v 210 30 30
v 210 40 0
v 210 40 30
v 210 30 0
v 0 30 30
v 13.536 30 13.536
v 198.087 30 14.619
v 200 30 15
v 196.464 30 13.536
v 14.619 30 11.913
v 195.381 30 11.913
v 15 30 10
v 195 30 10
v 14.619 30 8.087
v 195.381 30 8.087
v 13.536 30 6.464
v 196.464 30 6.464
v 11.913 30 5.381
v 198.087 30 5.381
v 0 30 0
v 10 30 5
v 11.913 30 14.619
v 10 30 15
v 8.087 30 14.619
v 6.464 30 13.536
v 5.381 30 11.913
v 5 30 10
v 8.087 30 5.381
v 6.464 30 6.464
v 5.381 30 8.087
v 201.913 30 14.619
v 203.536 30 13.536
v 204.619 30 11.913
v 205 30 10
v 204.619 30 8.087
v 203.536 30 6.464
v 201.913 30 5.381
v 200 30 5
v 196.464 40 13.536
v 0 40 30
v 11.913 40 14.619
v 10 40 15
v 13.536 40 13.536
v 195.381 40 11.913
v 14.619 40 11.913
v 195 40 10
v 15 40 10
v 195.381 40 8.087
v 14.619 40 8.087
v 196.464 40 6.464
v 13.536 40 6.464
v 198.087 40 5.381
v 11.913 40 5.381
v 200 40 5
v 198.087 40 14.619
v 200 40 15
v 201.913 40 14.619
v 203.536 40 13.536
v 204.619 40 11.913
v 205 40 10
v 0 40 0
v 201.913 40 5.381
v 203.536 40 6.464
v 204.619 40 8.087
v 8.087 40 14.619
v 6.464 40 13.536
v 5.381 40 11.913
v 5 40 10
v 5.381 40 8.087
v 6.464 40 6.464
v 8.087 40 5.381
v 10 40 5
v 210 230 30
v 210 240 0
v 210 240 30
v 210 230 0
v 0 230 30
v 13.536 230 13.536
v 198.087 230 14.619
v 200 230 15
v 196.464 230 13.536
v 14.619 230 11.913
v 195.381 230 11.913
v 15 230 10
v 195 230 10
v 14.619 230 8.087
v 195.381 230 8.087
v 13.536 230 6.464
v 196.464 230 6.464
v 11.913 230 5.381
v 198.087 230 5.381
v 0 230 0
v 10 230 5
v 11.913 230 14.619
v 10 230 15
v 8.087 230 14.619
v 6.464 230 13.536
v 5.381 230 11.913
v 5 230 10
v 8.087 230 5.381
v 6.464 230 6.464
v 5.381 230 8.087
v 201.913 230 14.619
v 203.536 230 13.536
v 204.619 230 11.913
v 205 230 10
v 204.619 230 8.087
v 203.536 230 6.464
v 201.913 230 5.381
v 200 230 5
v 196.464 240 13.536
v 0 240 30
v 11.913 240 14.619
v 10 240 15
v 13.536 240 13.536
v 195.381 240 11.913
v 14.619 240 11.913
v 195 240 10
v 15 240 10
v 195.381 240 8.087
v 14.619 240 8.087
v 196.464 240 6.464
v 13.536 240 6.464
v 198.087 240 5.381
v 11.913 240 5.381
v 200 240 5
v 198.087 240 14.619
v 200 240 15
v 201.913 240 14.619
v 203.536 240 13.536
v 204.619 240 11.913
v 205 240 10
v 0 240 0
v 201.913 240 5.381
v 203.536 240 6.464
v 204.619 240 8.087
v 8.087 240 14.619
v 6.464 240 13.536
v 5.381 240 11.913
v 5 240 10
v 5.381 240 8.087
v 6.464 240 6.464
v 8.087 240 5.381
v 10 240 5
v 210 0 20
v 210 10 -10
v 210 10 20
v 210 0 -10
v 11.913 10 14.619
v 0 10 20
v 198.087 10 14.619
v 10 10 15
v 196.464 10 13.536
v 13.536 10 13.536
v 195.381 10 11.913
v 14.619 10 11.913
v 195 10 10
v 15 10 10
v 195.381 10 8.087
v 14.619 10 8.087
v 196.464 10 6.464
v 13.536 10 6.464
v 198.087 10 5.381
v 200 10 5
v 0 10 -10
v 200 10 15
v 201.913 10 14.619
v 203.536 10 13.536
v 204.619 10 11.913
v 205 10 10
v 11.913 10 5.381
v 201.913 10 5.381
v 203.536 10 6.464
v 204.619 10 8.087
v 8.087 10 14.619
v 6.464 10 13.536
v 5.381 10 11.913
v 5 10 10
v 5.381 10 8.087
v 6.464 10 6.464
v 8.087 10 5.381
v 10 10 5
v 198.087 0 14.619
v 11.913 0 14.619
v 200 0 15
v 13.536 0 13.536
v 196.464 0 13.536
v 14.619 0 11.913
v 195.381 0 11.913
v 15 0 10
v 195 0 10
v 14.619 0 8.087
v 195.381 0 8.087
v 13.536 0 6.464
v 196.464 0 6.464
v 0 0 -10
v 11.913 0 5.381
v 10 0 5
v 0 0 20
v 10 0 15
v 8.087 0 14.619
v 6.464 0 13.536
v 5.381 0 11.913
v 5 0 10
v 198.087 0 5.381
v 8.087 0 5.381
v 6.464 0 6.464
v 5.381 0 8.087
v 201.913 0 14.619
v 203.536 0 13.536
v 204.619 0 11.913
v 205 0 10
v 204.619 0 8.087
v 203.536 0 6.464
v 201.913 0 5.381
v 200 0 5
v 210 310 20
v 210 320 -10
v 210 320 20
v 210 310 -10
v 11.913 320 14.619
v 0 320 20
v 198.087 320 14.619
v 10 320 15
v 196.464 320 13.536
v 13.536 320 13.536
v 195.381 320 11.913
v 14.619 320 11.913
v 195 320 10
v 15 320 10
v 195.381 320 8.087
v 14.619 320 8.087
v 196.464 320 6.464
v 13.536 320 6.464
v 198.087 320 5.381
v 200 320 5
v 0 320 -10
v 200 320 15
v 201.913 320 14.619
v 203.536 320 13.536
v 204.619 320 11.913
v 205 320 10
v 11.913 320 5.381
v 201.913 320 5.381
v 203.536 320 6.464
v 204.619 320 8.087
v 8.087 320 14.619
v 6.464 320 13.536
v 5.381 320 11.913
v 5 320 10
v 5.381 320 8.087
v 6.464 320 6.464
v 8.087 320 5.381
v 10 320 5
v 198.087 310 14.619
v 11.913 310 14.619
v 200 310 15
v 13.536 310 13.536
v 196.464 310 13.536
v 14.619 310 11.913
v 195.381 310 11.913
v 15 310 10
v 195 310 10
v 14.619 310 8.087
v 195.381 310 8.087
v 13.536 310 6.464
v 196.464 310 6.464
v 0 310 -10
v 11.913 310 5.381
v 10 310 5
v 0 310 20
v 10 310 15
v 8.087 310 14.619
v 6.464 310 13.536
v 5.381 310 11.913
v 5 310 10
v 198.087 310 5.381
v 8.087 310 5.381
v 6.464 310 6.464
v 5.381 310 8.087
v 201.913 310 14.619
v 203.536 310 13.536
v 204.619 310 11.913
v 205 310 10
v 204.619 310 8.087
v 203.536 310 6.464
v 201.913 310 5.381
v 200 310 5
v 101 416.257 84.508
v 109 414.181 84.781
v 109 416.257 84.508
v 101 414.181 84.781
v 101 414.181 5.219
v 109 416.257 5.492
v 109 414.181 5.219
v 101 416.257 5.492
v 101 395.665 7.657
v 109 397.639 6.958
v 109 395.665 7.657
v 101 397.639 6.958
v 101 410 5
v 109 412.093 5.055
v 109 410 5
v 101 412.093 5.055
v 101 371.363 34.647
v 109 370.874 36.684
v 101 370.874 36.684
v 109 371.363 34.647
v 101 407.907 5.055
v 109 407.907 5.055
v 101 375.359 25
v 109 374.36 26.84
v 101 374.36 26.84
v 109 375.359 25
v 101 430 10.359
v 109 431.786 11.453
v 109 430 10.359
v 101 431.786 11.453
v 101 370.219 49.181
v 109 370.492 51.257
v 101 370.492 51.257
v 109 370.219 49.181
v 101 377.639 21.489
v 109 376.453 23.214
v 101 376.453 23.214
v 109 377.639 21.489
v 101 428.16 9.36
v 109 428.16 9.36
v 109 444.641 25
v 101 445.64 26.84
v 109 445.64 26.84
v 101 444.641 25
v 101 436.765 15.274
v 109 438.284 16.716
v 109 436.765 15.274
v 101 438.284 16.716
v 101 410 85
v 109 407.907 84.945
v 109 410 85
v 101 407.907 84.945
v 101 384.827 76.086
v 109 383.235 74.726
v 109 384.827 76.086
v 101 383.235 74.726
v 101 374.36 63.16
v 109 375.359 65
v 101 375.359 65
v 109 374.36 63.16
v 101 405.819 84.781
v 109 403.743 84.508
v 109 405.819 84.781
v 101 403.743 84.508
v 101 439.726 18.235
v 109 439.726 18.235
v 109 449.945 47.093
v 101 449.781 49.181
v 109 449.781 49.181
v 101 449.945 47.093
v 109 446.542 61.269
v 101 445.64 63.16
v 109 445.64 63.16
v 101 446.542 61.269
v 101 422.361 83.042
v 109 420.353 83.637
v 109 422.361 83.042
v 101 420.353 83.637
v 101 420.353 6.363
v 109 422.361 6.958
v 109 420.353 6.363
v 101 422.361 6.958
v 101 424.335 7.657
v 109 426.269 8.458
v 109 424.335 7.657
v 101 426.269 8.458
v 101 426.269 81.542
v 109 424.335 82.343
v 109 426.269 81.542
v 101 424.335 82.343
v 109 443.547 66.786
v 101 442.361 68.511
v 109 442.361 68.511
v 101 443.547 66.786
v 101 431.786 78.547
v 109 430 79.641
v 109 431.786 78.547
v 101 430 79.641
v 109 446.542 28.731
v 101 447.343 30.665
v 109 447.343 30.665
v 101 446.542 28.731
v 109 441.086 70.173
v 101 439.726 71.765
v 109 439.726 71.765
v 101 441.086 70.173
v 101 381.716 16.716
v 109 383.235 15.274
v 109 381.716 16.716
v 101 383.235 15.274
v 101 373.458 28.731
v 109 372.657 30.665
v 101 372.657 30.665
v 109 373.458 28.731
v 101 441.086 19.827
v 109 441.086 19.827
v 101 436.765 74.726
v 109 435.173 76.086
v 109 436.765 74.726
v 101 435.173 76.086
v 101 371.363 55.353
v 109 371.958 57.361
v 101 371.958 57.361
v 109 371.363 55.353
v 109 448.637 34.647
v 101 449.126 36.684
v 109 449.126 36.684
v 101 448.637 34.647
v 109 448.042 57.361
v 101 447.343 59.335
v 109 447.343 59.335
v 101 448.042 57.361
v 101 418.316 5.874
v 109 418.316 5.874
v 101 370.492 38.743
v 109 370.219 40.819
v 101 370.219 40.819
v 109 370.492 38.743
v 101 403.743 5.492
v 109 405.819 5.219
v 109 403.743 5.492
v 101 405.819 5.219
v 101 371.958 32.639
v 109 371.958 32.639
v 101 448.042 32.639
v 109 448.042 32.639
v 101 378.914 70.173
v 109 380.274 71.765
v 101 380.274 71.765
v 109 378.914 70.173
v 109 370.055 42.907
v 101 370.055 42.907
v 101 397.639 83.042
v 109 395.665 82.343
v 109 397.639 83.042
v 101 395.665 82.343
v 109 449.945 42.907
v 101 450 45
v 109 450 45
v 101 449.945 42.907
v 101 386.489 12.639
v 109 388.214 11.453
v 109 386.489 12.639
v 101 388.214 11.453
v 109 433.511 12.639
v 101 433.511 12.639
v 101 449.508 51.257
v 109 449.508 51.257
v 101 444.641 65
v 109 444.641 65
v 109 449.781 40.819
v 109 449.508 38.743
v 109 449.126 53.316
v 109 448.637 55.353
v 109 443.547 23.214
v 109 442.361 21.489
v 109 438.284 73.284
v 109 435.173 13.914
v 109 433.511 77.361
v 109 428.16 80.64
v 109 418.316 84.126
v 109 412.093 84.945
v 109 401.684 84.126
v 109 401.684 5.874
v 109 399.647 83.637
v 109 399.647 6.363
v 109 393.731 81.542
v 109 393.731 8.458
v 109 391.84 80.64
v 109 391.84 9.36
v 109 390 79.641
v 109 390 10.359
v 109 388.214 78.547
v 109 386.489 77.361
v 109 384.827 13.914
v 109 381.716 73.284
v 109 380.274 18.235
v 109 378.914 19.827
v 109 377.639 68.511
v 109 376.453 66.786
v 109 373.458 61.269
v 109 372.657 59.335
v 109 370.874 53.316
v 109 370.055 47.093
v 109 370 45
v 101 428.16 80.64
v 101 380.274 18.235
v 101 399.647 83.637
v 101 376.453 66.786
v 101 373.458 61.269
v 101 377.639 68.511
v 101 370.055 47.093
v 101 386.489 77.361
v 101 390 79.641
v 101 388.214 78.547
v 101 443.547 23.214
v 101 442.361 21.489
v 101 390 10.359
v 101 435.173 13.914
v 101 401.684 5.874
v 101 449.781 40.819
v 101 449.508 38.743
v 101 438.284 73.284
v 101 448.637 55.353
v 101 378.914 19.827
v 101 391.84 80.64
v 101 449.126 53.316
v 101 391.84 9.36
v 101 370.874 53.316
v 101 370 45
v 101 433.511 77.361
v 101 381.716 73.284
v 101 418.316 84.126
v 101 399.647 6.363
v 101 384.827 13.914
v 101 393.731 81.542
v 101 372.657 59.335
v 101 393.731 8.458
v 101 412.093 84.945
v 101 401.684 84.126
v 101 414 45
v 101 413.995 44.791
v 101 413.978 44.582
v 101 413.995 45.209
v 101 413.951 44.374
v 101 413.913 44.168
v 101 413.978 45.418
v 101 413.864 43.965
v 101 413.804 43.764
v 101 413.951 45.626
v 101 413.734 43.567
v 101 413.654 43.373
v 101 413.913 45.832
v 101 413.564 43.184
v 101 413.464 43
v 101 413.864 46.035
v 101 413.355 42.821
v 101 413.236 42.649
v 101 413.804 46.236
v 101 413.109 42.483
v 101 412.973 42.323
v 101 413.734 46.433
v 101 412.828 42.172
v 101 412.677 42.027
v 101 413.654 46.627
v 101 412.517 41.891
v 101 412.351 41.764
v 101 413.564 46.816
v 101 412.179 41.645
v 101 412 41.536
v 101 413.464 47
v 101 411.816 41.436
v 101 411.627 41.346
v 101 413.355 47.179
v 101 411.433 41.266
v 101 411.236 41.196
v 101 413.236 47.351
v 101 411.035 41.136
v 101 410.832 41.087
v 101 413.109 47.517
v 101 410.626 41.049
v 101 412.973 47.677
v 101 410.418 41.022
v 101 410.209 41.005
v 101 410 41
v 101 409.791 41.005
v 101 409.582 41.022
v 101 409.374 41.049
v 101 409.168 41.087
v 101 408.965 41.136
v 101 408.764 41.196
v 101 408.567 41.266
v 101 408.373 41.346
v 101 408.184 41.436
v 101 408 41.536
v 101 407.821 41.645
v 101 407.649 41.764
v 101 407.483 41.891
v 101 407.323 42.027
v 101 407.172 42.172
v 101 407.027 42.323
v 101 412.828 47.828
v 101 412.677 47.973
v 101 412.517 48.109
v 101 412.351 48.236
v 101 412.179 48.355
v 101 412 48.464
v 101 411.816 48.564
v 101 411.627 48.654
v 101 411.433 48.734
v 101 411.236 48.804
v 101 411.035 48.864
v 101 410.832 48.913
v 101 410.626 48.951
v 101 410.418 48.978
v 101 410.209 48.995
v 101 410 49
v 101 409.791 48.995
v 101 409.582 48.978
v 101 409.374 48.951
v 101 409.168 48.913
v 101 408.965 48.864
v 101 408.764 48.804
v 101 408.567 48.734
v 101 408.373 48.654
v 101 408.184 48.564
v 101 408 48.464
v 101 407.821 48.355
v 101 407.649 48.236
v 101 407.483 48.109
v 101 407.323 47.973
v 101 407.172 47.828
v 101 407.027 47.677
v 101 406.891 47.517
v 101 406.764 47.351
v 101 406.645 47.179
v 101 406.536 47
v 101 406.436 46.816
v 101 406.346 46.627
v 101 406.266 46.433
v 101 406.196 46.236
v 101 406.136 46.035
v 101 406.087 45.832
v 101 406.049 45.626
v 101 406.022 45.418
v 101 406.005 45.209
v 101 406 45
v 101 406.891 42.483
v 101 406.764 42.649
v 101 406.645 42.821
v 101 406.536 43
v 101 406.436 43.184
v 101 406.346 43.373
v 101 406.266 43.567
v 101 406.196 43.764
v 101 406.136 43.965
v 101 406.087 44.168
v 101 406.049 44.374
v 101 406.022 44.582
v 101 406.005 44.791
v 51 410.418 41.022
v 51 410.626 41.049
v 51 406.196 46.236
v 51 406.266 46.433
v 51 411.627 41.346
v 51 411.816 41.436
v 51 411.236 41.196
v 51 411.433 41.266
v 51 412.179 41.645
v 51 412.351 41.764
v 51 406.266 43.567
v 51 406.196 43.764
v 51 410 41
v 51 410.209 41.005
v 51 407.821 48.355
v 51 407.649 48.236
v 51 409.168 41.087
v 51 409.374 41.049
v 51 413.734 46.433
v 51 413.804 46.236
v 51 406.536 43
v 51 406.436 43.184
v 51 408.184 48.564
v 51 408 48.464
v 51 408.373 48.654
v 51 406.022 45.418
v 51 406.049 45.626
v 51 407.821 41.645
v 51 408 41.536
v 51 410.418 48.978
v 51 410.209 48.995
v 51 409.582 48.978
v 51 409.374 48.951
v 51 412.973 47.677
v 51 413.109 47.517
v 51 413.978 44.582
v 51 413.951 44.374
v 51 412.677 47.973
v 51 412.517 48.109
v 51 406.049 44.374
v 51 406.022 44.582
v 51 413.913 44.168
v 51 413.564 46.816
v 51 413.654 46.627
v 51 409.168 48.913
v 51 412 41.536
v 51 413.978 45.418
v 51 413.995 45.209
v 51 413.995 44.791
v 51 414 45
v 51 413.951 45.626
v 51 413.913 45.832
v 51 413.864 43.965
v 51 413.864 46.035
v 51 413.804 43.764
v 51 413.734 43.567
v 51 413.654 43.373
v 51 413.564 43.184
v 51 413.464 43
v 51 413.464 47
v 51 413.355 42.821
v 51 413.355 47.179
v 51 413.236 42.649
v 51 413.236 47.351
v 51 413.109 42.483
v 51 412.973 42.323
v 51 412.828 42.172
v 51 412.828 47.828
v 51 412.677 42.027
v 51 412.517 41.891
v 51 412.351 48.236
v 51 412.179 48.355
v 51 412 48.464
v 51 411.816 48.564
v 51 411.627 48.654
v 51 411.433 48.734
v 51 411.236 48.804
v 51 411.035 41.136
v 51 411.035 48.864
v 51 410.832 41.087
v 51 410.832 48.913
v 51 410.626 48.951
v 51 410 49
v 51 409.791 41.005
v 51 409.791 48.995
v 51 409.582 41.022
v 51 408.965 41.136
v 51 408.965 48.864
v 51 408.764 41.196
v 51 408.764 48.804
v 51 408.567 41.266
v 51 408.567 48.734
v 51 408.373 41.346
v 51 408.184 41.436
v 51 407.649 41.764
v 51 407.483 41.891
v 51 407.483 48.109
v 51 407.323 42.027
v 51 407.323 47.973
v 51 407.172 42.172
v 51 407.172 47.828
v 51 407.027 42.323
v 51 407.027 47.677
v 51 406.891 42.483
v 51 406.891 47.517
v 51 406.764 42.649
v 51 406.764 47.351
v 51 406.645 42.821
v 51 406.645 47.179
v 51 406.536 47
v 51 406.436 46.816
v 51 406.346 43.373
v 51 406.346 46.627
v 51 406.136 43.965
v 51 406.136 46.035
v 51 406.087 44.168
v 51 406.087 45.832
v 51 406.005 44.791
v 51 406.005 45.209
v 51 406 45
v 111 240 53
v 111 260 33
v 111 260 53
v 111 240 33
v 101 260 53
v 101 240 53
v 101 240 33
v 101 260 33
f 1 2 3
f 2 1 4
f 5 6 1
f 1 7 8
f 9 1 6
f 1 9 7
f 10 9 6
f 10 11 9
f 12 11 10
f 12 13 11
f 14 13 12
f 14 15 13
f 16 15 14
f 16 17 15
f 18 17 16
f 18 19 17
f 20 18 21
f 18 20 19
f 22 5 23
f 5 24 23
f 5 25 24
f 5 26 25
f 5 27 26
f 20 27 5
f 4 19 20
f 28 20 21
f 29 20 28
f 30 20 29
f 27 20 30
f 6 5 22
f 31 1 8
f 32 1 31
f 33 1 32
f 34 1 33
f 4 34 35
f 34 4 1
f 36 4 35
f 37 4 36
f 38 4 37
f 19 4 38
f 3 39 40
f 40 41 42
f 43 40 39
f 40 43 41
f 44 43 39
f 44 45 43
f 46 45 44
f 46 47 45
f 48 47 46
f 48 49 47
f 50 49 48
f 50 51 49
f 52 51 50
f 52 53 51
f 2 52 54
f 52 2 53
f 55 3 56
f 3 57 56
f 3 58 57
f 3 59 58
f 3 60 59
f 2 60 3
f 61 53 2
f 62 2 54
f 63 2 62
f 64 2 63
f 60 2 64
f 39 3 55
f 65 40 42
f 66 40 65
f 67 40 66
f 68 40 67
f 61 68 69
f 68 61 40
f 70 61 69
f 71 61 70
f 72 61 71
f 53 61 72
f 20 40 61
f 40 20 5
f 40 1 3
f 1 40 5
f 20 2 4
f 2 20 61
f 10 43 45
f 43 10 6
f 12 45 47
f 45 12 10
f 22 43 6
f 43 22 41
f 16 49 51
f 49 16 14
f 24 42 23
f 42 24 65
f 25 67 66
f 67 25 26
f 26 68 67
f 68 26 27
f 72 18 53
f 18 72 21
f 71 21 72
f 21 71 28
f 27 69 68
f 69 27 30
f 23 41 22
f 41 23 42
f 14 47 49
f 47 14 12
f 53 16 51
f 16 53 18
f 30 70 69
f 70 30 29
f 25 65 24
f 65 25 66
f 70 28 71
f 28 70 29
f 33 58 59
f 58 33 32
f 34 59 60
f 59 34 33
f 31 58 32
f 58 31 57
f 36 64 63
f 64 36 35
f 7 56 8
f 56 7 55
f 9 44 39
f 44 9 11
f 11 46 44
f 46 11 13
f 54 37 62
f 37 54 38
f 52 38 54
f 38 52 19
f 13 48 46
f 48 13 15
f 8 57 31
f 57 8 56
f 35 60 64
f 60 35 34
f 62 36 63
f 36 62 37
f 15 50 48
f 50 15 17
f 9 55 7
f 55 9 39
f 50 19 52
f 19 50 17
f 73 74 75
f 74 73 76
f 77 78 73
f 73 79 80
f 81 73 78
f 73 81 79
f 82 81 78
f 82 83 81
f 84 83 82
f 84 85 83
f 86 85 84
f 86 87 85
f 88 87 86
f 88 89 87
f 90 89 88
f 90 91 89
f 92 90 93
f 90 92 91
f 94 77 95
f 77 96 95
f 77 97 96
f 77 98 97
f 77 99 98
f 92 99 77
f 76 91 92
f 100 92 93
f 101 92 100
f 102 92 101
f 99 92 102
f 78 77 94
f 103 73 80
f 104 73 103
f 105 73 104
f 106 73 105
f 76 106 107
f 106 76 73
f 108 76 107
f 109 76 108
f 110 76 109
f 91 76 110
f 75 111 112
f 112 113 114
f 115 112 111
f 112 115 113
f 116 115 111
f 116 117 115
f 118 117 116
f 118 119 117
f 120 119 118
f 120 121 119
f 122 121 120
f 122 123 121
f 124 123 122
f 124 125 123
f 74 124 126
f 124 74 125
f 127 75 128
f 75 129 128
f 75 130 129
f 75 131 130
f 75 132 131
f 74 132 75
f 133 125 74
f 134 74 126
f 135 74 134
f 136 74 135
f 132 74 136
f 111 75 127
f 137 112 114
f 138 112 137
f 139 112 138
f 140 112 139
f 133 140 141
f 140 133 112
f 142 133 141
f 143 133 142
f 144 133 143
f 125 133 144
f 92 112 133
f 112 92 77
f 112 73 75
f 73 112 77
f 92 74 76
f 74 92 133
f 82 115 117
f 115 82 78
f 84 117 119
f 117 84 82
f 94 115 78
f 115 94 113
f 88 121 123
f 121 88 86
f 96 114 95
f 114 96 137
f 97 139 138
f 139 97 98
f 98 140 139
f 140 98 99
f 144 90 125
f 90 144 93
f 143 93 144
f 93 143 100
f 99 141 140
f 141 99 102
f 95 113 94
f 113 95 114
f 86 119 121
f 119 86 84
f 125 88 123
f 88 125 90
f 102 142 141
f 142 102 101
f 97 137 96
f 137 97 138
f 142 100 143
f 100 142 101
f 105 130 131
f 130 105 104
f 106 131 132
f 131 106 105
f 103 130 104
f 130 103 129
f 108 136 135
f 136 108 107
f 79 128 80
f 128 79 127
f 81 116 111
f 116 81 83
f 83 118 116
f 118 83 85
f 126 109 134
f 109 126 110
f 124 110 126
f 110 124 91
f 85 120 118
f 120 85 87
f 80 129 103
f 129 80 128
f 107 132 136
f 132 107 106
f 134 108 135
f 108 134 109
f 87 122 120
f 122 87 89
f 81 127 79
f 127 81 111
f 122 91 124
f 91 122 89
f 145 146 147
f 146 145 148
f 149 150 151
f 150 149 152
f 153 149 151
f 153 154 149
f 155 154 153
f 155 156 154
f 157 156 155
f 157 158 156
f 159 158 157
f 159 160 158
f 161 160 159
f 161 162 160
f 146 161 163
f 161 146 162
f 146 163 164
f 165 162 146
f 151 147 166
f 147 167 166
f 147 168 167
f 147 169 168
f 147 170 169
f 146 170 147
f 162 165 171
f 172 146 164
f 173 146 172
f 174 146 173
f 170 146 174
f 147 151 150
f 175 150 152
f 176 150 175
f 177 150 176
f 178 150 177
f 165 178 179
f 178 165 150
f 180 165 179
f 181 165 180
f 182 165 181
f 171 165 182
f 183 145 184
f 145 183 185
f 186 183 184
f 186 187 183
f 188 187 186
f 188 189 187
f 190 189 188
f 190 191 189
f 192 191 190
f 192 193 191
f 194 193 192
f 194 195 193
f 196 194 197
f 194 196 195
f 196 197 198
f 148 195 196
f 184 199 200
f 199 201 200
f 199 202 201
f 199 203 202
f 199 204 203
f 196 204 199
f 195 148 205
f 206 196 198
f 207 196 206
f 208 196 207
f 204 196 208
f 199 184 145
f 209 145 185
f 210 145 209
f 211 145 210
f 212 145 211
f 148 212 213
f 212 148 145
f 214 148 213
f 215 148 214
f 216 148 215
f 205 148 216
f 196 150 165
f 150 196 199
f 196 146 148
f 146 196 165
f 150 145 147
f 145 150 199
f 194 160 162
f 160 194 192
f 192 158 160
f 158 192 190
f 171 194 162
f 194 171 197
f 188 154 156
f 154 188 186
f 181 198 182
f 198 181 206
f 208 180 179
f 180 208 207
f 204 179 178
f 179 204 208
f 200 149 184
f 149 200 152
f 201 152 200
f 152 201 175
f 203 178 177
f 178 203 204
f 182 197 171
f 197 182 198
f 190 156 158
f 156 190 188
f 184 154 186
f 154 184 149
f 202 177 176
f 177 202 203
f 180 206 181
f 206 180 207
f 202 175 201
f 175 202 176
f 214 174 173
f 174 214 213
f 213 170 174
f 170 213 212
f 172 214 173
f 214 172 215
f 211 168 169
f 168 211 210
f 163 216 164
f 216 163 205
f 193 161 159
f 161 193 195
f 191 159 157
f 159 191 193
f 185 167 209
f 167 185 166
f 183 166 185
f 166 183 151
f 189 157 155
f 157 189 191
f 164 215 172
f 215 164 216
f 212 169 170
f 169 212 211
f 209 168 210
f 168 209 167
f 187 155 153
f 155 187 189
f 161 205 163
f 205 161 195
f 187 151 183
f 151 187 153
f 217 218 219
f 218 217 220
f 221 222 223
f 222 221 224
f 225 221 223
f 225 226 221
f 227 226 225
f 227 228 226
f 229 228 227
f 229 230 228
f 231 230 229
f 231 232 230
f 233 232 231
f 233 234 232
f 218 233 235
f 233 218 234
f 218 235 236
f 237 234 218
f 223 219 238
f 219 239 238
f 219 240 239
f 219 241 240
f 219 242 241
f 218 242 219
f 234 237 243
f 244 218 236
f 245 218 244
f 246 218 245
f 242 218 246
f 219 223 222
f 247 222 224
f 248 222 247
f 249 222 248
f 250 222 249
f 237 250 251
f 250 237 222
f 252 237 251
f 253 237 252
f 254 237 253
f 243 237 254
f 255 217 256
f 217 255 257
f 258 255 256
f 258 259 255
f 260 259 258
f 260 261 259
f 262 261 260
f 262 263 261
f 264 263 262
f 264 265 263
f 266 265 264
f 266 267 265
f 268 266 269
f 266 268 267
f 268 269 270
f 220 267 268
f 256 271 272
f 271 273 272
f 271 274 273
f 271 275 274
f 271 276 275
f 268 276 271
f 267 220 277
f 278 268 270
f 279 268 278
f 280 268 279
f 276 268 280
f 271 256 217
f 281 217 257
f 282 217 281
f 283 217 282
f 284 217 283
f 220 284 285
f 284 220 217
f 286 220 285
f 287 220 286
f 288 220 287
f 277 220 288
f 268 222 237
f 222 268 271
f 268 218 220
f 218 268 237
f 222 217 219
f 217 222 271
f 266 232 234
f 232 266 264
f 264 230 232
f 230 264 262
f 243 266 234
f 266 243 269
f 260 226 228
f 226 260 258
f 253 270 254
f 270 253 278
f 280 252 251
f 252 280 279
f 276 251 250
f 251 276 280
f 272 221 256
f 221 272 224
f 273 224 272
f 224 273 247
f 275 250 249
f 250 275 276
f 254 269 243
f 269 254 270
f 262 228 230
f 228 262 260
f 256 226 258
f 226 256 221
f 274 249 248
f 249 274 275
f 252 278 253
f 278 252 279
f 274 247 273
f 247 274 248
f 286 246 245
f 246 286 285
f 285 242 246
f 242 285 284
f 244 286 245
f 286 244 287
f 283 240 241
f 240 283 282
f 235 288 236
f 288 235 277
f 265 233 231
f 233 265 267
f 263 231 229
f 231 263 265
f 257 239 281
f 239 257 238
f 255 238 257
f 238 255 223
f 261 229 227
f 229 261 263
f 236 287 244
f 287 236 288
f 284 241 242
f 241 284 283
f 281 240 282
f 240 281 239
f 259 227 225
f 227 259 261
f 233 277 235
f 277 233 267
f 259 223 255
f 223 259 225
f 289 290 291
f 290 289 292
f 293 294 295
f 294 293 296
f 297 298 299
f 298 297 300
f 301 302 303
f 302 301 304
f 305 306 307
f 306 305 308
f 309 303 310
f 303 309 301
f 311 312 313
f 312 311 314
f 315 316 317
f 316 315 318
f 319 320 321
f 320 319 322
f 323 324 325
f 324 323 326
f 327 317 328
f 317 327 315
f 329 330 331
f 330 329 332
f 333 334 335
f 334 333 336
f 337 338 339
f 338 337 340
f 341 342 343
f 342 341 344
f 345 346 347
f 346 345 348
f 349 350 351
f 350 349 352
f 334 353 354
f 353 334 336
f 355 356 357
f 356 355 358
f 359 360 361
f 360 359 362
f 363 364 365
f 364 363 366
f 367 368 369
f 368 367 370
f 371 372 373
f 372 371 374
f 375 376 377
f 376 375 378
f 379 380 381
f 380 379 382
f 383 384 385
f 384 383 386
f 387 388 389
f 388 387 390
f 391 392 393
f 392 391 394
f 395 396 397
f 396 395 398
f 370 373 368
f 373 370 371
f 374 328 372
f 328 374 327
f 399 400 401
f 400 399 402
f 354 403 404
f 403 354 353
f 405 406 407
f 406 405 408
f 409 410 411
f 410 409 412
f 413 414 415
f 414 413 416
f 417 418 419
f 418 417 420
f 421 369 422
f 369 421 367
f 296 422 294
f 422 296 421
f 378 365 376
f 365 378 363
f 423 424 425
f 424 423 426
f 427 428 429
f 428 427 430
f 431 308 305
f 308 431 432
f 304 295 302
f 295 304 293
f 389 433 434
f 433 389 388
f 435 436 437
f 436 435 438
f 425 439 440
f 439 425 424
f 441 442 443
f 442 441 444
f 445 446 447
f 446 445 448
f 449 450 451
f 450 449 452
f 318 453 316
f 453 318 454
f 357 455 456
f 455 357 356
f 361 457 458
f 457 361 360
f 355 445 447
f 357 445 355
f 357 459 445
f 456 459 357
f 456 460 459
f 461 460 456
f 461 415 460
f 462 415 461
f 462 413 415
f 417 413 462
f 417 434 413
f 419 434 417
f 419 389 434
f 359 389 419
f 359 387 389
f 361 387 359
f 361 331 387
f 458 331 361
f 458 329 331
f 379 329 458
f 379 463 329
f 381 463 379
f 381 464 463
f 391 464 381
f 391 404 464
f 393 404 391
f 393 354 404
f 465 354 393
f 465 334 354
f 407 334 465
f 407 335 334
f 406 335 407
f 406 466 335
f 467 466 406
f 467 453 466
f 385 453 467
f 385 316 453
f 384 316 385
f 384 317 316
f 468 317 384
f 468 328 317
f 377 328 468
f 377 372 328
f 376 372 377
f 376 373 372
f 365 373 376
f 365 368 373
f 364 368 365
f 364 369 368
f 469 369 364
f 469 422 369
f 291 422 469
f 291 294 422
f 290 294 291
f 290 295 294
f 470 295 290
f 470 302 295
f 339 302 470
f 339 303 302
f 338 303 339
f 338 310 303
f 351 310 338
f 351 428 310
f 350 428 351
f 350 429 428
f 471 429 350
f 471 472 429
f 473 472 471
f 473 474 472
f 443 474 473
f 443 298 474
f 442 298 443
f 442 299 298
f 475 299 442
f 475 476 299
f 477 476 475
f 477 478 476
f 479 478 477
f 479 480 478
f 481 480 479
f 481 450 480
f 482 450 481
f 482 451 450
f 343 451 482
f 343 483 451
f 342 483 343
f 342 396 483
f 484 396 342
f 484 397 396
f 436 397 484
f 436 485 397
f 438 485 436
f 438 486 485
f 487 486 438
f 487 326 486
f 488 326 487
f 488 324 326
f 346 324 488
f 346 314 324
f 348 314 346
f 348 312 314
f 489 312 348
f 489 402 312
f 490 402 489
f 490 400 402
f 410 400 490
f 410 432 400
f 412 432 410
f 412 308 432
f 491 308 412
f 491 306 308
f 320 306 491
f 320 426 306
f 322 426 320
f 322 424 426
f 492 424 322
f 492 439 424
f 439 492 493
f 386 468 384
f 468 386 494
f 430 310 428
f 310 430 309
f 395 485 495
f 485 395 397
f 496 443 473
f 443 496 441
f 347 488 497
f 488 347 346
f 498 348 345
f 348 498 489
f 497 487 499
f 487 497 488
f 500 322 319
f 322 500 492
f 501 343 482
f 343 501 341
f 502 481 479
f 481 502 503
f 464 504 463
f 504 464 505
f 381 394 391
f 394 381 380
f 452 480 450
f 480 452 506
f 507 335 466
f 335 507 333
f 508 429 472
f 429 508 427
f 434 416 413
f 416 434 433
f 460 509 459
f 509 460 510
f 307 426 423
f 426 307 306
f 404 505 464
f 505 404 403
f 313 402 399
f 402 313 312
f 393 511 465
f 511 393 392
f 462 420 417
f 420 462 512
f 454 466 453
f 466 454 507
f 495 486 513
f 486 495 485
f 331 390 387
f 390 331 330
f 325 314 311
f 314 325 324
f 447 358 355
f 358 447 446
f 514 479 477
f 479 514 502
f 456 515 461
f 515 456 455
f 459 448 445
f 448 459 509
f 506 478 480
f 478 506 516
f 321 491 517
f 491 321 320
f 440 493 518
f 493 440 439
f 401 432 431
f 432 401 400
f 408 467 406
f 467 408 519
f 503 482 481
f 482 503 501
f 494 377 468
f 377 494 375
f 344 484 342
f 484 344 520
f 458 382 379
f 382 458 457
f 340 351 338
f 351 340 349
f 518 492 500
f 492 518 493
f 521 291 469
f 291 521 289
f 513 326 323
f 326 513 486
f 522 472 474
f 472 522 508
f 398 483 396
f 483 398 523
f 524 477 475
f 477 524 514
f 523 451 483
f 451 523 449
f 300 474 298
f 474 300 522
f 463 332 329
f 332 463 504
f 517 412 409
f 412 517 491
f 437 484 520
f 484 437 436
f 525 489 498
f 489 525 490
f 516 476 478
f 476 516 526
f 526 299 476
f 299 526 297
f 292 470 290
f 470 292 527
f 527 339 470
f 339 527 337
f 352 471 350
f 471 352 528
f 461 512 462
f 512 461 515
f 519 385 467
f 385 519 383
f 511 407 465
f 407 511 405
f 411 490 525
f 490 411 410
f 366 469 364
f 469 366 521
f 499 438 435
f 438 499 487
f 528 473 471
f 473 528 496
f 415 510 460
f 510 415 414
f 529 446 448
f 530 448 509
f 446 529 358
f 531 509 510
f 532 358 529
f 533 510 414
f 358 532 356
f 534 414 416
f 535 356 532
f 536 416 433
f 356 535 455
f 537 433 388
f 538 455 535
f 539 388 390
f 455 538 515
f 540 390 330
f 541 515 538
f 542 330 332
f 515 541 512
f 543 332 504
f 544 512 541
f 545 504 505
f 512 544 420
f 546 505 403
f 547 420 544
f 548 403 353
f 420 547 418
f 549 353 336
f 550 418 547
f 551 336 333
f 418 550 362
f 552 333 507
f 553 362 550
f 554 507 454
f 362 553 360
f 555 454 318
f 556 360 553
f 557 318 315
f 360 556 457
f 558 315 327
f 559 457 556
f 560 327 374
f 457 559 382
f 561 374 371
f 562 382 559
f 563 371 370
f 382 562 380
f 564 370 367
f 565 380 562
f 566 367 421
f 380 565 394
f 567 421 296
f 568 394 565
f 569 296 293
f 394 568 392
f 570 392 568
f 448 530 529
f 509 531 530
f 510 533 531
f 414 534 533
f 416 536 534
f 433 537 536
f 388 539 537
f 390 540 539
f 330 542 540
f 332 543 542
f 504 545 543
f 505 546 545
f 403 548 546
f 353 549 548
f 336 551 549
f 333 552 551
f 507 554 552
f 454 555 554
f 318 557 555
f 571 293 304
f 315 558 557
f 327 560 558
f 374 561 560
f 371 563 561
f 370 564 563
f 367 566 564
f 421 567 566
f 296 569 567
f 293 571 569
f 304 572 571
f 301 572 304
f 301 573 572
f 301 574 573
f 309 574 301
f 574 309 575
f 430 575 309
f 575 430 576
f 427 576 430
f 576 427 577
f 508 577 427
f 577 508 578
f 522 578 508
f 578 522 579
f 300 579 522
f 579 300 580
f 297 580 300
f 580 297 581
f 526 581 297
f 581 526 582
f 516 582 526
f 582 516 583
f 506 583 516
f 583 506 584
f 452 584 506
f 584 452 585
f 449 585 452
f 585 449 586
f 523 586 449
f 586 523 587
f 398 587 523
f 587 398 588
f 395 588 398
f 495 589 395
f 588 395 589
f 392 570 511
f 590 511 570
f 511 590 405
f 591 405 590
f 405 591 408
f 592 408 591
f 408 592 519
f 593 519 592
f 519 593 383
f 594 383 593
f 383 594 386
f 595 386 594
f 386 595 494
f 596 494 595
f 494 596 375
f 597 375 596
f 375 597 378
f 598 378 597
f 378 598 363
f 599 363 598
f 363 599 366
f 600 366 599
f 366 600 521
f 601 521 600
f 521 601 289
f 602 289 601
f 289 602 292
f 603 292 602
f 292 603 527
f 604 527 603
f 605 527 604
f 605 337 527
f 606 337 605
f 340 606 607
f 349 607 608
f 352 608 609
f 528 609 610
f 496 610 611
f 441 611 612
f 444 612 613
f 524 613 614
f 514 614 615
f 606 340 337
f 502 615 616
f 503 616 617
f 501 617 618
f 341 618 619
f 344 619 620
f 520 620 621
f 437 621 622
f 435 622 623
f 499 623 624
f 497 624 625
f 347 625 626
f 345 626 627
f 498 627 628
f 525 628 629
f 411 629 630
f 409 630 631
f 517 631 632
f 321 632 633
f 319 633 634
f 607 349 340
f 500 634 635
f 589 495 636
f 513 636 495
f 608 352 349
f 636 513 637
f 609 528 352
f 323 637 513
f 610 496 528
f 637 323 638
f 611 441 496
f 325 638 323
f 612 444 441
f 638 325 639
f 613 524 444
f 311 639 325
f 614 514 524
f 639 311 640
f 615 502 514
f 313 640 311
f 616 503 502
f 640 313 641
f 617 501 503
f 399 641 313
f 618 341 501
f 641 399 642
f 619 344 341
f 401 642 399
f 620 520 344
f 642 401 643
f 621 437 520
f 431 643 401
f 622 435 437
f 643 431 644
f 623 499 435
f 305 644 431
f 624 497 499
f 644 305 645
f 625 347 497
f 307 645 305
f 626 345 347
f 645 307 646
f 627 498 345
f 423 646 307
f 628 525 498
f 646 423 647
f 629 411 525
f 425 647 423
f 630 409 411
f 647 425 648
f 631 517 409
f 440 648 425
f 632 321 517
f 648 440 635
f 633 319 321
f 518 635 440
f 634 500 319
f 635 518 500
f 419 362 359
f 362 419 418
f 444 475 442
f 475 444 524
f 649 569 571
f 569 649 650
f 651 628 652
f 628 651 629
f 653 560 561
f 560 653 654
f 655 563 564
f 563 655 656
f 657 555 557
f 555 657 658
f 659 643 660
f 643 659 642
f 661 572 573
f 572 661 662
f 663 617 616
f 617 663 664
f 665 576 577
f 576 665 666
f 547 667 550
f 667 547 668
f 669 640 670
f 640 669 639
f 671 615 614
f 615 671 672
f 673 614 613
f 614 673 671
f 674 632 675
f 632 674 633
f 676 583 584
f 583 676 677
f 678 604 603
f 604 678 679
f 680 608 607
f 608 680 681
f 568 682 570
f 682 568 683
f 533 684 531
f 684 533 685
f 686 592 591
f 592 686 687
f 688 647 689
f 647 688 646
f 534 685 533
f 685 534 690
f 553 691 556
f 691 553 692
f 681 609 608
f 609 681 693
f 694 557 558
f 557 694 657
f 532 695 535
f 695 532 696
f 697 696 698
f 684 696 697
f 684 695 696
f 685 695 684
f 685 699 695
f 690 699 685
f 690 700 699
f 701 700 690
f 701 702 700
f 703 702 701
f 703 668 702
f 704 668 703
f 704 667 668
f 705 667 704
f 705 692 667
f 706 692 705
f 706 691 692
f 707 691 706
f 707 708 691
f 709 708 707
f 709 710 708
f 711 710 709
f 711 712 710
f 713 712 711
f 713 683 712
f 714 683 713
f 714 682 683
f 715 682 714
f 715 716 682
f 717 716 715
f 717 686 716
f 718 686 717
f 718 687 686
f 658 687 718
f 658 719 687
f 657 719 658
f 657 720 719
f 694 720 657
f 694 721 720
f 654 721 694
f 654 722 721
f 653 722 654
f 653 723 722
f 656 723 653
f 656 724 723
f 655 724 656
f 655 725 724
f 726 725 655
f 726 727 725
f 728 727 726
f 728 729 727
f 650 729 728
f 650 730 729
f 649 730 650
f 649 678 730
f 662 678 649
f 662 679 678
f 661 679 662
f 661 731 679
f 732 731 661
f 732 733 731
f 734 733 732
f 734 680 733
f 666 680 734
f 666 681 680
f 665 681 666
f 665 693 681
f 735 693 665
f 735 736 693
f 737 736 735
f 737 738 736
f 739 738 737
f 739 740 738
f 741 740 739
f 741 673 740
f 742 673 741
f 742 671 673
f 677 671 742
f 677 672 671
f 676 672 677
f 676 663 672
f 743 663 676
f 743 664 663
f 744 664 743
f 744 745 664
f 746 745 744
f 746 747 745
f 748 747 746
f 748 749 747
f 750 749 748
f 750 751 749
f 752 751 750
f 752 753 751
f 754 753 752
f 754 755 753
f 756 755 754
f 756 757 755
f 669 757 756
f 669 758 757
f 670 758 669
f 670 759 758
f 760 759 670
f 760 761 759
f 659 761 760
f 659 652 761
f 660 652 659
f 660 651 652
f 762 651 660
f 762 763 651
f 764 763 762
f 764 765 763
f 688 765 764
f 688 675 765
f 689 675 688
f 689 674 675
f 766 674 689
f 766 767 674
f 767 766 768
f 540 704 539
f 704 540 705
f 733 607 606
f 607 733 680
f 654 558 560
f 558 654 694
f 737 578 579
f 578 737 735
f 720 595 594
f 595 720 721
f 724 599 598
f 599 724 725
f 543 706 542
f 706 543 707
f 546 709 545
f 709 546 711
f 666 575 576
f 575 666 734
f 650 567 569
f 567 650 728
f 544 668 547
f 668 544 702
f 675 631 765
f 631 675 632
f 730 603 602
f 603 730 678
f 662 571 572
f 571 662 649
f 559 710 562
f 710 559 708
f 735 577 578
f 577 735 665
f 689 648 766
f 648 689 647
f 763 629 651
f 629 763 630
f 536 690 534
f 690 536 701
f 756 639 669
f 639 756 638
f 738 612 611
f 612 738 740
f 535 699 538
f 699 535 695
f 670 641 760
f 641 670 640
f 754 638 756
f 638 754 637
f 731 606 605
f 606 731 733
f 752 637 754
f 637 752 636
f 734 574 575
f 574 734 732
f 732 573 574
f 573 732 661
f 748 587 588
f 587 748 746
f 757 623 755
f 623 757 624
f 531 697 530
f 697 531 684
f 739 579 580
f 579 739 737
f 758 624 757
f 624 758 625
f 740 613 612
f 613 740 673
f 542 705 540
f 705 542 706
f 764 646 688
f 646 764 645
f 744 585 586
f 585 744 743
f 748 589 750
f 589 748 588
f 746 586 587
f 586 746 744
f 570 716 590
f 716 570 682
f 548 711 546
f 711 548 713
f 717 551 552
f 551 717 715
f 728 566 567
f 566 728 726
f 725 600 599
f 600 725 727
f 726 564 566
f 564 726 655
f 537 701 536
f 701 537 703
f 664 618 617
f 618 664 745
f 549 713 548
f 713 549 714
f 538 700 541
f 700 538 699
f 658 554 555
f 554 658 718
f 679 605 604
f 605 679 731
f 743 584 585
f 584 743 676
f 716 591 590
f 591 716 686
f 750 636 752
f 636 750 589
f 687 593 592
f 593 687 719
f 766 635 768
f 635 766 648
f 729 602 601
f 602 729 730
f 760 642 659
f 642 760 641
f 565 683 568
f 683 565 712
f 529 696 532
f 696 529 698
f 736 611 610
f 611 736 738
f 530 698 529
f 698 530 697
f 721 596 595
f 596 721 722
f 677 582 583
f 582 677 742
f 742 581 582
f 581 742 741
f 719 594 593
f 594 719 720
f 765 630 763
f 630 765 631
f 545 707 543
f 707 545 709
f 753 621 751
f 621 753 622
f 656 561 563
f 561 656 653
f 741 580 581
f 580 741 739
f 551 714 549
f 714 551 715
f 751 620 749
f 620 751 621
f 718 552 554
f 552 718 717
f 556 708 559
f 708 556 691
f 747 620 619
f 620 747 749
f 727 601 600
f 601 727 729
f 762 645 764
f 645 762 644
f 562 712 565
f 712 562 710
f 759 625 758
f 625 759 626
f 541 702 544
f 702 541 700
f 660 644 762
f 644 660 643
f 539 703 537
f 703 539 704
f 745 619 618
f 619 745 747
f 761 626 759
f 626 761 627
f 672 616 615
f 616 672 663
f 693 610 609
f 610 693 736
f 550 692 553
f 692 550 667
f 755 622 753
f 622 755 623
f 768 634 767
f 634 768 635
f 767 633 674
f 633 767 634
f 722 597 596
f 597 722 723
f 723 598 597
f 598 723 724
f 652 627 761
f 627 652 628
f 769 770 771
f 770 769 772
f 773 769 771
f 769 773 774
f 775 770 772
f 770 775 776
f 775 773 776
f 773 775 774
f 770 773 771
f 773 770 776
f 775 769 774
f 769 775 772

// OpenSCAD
translate([0,40,0])rotate([90,0,0])guia();
translate([0,240,0])rotate([90,0,0])guia();
translate([0,0,20])rotate([-90,0,0])guia();
translate([0,310,20])rotate([-90,0,0])guia();
%translate([10,0,10])rotate([-90,0,0])cylinder(d=10,h=320,$fn=60);
%translate([200,0,10])rotate([-90,0,0])cylinder(d=10,h=320,$fn=60);
%translate([0,50,30])cube([210,210,3]);
%translate([0,0,-29])cube([210,450,19]);

translate([101,410,45])rotate([0,90,0])cylinder(d=80,h=8,$fn=120);
translate([51,410,45])rotate([0,90,0])cylinder(d=8,h=50,$fn=120);
%translate([65,395,-10])cube([35,30,70]);
translate([101,240,33])cube([10,20,20]);

module guia(){
difference(){
cube([210,30,10]);
translate([10,10,-1])cylinder(d=10,h=12);
translate([200,10,-1])cylinder(d=10,h=12);
}
}
